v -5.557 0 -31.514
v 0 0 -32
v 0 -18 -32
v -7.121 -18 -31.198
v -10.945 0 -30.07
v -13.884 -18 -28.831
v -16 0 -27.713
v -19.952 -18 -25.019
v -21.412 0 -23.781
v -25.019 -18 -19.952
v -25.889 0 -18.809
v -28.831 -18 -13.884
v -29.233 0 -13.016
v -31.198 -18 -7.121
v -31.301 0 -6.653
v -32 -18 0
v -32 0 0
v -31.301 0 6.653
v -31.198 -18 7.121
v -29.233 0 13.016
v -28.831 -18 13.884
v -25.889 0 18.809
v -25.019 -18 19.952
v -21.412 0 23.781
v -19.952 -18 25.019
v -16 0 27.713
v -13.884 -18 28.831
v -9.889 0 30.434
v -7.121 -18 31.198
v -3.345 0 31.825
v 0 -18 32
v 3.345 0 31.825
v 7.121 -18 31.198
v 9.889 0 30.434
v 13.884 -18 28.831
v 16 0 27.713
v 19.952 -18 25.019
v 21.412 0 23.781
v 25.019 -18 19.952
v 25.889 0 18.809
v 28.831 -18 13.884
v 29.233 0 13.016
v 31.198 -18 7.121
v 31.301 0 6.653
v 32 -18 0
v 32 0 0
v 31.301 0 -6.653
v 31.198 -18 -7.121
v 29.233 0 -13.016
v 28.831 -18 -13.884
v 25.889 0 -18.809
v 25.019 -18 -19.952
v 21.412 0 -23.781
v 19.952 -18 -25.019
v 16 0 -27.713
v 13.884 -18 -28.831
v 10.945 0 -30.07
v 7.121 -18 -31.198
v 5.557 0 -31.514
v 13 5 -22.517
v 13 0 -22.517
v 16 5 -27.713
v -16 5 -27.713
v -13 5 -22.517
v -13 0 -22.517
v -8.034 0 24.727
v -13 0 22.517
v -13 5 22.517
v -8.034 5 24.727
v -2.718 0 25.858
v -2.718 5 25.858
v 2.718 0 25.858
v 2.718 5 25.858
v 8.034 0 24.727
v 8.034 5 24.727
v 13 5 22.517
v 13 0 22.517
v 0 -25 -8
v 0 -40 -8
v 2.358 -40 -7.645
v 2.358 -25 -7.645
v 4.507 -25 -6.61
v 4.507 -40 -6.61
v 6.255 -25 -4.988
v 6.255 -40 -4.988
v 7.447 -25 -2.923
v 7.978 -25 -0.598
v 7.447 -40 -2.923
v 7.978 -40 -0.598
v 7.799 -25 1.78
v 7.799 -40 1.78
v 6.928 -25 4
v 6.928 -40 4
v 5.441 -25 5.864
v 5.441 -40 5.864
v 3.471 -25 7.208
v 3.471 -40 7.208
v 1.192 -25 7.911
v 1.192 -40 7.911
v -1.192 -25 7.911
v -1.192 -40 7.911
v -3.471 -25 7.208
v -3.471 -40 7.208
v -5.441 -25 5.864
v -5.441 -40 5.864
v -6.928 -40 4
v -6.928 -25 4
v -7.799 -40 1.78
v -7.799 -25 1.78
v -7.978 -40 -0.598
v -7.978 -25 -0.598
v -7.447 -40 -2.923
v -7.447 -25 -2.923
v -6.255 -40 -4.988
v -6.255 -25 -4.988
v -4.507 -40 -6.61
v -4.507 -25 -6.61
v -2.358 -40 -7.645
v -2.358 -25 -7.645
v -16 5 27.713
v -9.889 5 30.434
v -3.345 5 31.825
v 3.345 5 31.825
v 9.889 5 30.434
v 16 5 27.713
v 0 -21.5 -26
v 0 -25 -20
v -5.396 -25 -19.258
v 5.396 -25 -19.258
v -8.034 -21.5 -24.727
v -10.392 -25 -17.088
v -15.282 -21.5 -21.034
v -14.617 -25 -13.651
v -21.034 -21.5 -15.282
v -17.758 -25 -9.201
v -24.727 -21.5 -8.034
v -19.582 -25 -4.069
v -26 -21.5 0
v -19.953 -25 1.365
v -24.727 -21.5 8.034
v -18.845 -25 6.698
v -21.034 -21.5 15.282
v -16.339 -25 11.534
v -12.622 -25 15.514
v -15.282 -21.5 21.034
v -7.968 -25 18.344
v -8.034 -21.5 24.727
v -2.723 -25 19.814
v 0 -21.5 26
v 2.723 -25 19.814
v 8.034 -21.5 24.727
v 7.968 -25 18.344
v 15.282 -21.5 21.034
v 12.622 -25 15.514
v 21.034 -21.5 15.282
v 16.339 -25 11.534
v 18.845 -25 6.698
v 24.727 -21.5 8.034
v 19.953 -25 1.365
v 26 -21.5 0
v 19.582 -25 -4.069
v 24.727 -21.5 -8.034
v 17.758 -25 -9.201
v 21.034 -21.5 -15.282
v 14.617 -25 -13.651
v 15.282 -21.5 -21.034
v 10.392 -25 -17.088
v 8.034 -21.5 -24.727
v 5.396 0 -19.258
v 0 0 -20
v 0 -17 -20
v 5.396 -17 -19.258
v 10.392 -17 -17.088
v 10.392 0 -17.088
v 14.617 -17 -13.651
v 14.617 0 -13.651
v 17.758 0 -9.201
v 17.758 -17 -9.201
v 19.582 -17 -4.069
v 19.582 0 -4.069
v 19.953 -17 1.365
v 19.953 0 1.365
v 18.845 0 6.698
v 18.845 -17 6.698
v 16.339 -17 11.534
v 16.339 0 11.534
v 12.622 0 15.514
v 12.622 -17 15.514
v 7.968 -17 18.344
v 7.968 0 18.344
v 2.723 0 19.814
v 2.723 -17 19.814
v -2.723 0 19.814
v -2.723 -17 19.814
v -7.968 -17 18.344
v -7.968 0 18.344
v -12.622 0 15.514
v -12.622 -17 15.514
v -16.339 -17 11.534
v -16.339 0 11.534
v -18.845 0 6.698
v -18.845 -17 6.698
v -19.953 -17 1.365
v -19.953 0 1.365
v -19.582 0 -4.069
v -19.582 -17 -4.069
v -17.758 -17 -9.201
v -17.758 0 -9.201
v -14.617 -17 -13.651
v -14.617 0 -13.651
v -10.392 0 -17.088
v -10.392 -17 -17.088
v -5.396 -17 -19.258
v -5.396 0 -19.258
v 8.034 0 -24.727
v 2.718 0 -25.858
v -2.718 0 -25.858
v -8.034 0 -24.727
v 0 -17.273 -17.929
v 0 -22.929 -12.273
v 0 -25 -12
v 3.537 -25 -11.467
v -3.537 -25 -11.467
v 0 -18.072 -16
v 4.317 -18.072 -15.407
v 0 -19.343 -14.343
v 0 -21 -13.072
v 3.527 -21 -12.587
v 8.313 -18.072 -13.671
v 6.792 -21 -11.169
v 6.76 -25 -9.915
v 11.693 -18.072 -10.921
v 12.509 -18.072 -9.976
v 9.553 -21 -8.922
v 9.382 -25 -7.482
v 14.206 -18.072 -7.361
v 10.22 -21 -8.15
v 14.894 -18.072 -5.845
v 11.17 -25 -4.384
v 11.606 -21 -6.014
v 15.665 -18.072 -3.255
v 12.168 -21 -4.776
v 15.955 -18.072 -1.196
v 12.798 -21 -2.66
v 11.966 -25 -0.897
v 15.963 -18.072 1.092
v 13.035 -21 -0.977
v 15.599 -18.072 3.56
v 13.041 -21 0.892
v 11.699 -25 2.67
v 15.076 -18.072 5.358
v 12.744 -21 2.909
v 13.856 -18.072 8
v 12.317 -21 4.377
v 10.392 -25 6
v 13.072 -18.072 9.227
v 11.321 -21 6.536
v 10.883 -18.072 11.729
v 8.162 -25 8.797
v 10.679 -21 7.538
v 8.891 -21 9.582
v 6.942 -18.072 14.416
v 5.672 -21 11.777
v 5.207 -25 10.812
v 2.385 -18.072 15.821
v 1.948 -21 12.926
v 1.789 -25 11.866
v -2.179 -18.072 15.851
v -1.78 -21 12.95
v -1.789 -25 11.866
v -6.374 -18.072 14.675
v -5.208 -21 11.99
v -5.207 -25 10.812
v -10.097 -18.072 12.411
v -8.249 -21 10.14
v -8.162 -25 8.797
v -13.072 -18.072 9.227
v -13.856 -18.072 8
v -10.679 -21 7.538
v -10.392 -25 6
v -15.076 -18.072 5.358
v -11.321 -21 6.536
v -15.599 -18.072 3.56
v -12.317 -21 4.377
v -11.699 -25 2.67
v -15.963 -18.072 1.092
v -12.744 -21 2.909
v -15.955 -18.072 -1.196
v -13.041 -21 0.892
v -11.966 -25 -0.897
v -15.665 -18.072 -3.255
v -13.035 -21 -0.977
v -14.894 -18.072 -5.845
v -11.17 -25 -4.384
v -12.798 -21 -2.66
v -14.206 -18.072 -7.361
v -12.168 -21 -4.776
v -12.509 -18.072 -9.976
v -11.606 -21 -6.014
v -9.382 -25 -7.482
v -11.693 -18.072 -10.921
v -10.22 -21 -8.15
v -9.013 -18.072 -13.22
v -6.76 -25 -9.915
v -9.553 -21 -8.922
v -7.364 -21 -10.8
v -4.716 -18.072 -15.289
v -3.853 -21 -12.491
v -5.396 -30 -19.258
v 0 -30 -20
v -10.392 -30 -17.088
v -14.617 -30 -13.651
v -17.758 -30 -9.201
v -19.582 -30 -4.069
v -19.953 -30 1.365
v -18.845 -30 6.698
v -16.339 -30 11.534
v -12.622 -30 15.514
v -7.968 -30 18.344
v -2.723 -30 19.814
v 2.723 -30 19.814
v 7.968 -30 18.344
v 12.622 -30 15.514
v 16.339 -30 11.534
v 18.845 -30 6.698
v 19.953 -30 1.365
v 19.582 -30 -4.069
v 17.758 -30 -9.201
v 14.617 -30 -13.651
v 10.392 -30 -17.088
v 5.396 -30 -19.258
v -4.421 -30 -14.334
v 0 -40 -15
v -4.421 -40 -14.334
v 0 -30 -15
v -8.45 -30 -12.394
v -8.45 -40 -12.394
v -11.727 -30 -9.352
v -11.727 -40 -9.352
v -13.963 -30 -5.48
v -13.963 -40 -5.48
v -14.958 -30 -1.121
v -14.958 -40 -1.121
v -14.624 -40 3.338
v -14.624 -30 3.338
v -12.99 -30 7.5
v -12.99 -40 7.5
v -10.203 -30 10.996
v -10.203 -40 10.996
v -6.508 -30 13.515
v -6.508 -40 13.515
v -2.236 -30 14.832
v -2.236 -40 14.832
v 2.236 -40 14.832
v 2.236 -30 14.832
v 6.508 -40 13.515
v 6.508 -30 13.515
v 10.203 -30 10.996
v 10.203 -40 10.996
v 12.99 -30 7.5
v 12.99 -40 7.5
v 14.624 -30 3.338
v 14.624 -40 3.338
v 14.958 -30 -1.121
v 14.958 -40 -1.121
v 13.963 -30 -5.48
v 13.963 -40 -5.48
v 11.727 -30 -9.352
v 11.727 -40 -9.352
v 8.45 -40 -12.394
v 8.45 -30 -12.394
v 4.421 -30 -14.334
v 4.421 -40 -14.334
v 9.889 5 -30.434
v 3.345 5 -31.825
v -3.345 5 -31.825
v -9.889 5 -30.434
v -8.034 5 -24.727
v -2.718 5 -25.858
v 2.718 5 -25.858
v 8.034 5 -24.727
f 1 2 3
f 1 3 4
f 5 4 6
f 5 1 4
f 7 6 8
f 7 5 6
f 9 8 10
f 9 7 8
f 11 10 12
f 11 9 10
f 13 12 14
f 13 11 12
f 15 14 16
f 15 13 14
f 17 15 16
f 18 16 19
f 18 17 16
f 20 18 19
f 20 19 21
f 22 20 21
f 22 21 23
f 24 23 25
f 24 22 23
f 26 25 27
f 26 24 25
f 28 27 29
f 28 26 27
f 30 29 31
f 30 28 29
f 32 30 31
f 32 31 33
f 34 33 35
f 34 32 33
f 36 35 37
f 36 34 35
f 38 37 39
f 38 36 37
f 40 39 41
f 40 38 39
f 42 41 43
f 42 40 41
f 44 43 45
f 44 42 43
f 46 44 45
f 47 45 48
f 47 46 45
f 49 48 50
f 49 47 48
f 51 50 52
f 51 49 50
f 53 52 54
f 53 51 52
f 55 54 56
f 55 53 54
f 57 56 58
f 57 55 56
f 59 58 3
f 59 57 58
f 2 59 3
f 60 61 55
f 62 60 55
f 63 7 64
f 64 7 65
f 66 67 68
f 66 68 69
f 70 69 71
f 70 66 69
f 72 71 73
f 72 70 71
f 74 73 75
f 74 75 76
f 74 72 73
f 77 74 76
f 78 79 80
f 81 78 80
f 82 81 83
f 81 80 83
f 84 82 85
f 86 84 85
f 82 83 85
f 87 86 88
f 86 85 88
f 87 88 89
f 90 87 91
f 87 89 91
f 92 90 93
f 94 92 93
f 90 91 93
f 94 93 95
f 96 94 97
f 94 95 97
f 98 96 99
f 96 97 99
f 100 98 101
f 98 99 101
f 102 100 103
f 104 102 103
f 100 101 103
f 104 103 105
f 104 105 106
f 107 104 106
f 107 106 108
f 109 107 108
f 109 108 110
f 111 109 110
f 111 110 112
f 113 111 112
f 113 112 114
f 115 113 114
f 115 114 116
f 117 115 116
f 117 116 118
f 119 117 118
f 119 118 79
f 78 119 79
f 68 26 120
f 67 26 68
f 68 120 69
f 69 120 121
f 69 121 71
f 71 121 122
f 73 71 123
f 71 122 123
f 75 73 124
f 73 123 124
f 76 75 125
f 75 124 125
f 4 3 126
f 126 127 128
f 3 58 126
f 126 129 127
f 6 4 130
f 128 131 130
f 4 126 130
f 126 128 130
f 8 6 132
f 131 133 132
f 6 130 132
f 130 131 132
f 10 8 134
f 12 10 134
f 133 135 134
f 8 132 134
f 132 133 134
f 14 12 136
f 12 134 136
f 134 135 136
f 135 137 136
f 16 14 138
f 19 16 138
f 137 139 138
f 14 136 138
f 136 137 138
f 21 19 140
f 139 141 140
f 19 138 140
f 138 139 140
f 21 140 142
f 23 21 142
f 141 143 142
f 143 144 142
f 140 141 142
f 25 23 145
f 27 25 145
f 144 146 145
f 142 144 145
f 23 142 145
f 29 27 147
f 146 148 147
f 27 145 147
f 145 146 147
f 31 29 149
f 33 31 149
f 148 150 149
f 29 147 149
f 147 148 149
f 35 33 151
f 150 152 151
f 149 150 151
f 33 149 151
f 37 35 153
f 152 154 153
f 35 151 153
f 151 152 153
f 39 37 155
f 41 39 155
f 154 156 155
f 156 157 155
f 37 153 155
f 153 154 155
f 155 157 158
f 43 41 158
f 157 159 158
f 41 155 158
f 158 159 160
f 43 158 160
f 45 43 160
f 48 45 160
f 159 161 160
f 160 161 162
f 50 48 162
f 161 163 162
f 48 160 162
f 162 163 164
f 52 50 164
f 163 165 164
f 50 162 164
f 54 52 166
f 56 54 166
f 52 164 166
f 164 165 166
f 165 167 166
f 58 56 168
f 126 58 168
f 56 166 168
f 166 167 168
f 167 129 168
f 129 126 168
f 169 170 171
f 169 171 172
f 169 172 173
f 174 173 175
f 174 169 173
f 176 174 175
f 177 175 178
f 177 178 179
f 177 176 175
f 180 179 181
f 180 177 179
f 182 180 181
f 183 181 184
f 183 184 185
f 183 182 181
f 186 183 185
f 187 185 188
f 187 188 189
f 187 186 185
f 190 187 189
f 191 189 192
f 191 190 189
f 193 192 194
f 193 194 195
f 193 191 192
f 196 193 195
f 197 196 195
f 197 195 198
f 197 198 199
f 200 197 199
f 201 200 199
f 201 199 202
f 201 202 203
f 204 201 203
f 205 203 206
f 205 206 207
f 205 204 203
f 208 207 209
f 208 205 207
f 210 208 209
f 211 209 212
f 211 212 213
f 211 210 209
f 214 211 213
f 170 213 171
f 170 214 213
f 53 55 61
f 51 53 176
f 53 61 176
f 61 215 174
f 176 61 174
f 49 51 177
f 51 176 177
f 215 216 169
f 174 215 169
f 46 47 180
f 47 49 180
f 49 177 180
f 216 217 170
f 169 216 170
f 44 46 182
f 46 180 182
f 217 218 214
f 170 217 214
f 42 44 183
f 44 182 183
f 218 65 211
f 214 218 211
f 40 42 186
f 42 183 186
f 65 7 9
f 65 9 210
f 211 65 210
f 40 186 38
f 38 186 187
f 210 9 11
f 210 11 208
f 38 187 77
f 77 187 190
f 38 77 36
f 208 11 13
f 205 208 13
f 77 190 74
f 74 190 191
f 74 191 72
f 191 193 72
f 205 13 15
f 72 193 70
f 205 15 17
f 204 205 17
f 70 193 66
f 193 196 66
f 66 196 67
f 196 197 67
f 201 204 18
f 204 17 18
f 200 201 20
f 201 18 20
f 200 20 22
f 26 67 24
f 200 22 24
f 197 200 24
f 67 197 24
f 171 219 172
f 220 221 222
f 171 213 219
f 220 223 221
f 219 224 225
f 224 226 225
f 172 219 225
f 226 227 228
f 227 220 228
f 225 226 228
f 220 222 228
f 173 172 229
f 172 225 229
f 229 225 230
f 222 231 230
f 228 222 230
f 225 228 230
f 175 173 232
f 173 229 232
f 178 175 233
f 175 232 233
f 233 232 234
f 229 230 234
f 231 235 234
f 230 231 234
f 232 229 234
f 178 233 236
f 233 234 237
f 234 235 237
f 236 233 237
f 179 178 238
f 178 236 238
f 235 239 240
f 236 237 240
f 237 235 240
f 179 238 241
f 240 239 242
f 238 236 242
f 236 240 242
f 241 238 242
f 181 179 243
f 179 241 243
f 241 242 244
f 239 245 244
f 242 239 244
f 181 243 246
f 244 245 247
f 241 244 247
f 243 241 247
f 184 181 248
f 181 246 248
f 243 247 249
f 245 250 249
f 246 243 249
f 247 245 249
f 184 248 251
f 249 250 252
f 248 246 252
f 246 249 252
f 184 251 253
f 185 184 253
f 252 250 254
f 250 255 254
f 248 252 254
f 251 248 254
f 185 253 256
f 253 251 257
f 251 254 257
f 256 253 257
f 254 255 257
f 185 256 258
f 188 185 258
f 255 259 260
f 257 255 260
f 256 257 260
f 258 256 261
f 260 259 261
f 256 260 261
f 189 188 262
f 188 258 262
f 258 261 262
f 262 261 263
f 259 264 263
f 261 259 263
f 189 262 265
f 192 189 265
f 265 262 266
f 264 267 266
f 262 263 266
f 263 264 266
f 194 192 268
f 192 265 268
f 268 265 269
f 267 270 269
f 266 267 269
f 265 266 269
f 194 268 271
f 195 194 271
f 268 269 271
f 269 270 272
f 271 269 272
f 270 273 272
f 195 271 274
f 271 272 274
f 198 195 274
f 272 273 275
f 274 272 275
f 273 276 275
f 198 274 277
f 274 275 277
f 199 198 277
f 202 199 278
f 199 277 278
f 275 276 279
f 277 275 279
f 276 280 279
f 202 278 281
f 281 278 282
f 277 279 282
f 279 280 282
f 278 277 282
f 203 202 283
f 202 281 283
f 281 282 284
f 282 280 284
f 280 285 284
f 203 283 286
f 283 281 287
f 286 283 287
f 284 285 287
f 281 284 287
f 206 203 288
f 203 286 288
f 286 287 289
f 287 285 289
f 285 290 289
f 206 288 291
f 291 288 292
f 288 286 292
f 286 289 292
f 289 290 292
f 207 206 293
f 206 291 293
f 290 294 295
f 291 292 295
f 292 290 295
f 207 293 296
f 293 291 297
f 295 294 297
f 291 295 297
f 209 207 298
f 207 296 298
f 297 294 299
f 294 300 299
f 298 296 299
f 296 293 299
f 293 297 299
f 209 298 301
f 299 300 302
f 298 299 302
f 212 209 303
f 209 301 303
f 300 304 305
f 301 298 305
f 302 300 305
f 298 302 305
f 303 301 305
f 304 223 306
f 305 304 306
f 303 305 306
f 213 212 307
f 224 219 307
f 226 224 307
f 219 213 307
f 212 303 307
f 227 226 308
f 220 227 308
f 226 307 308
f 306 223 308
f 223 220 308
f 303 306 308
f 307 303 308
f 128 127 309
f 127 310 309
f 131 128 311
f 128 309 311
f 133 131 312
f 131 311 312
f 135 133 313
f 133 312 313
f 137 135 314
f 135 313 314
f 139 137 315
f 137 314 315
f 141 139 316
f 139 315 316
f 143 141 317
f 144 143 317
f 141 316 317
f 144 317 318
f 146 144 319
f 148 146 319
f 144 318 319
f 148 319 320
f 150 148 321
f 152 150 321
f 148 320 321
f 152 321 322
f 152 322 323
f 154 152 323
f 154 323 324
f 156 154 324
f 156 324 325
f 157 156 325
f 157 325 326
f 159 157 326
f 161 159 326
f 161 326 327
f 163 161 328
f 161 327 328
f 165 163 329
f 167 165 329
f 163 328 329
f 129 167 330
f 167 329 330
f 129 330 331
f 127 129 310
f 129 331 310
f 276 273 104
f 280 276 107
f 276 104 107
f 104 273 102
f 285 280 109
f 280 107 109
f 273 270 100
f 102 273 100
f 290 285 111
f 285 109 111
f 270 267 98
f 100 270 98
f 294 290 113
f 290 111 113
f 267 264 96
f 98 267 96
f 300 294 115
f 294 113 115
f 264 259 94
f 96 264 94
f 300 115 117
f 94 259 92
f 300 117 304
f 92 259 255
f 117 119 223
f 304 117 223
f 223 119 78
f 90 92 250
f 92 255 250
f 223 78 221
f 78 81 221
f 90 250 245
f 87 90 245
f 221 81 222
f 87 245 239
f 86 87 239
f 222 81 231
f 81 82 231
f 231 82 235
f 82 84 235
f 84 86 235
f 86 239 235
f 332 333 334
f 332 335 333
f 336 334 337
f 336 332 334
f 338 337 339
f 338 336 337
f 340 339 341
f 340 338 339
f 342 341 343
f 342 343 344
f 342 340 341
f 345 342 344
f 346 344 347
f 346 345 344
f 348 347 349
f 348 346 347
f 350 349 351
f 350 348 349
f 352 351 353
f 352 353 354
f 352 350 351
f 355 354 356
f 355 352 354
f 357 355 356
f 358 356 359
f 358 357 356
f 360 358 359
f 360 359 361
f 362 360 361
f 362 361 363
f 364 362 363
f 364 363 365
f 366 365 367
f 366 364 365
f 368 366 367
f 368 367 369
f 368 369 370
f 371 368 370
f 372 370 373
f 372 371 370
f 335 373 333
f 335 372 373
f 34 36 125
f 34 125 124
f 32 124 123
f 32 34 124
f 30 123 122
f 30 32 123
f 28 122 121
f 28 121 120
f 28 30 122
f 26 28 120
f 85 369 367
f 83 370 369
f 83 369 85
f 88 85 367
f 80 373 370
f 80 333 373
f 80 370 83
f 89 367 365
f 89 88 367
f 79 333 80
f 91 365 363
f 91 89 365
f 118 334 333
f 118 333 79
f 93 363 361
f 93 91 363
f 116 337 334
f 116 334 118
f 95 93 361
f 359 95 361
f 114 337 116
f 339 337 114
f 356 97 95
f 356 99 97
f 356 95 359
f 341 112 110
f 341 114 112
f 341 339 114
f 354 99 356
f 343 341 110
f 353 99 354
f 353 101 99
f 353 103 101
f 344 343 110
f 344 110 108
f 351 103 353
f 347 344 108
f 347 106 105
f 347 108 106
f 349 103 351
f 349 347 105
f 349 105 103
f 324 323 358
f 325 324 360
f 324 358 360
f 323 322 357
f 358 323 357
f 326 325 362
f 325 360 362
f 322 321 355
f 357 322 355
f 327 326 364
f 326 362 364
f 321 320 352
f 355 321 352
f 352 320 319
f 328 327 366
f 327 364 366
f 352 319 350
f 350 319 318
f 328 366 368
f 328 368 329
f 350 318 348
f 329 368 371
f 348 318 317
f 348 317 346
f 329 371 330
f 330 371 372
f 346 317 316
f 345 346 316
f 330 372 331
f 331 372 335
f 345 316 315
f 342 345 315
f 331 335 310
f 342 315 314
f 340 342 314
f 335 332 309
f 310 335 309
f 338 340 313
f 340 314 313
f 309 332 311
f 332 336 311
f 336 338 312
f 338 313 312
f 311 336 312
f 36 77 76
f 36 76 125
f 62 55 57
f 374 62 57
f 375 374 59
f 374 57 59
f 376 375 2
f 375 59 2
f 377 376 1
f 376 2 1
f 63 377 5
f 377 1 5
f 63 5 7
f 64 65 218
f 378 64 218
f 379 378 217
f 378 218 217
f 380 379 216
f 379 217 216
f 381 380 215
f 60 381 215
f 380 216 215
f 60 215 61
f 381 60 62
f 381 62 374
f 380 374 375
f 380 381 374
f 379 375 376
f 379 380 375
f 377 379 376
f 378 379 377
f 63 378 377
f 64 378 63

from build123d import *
from build123d.topology import SkipClean

# Parameters (mm, degrees)
SKETCH3_W           = 10
SKETCH3_H           = 15
SKETCH3_W_2         = 18
SKETCH3_H_2         = 32
BOSS_EXTRUDE2_DEPTH = 5
SKETCH5_R           = 8
CUT_EXTRUDE1_DEPTH  = 64.820059542
SKETCH6_W           = 17
SKETCH6_H           = 20


with BuildPart() as part:
    # Sketch3 → Revolve1 (revolve)
    with BuildSketch(Plane.YZ, mode=Mode.PRIVATE) as revolve1_sk:
        with Locations((-35, 7.5)):
            Rectangle(SKETCH3_W, SKETCH3_H)
        Polygon((-30, 0), (-25, 0), (-25, 20), (-30, 20), (-30, 15), align=None)
        Polygon((-25, 0), (-18, 0), (-18, 32), (-25, 20), align=None)
        with Locations((-9, 16)):
            Rectangle(SKETCH3_W_2, SKETCH3_H_2)
    revolve(revolve1_sk.sketch.rotate(Axis((0, -68.119839204, 0), (0, 1, 0)), 180), axis=Axis((0, -68.119839204, 0), (0, 1, 0)))

    # Sketch4 → Boss-Extrude2 (add)
    with SkipClean():  # the faces are left unmerged after this step: merging them gives an invalid solid
        with BuildSketch(Plane(origin=(0, 0, 0), x_dir=(-1, 0, 0), z_dir=(0, 1, 0))):
            with BuildLine():
                Line((-13, -22.516660498), (-16, -27.712812921))
                ThreePointArc((-16, -27.712812921), (0, -32), (16, -27.712812921))
                Line((16, -27.712812921), (13, -22.516660498))
                ThreePointArc((13, -22.516660498), (0, -26), (-13, -22.516660498))
            make_face()
            with BuildLine():
                Line((-13, 22.516660498), (-16, 27.712812921))
                ThreePointArc((-16, 27.712812921), (0, 32), (16, 27.712812921))
                Line((16, 27.712812921), (13, 22.516660498))
                ThreePointArc((13, 22.516660498), (0, 26), (-13, 22.516660498))
            make_face()
        extrude(amount=BOSS_EXTRUDE2_DEPTH)

    # Sketch5 → Cut-Extrude1 (cut, through all)
    with SkipClean():  # the faces are left unmerged after this step: merging them gives an invalid solid
        with BuildSketch(Plane.XZ.offset(40)):
            with Locations(Location((0, 0, 0), (0, 0, 270))):
                Circle(SKETCH5_R)
        extrude(amount=-CUT_EXTRUDE1_DEPTH, mode=Mode.SUBTRACT)

    # Sketch6 → Cut-Revolve1 (revolve, cut)
    with SkipClean():  # the faces are left unmerged after this step: merging them gives an invalid solid
        with BuildSketch(Plane.YZ, mode=Mode.PRIVATE) as cut_revolve1_sk:
            with Locations((-8.5, 10)):
                Rectangle(SKETCH6_W, SKETCH6_H)
            with BuildLine():
                Line((-17, 0), (-17, 20))
                ThreePointArc((-17, 20), (-19.343145751, 14.343145751), (-25, 12))
                Line((-25, 12), (-25, 0))
                Line((-25, 0), (-17, 0))
            make_face()
        revolve(cut_revolve1_sk.sketch.rotate(Axis((0, 48.192751934, 0), (0, -1, 0)), 180), axis=Axis((0, 48.192751934, 0), (0, -1, 0)), mode=Mode.SUBTRACT)


solid = part.part
